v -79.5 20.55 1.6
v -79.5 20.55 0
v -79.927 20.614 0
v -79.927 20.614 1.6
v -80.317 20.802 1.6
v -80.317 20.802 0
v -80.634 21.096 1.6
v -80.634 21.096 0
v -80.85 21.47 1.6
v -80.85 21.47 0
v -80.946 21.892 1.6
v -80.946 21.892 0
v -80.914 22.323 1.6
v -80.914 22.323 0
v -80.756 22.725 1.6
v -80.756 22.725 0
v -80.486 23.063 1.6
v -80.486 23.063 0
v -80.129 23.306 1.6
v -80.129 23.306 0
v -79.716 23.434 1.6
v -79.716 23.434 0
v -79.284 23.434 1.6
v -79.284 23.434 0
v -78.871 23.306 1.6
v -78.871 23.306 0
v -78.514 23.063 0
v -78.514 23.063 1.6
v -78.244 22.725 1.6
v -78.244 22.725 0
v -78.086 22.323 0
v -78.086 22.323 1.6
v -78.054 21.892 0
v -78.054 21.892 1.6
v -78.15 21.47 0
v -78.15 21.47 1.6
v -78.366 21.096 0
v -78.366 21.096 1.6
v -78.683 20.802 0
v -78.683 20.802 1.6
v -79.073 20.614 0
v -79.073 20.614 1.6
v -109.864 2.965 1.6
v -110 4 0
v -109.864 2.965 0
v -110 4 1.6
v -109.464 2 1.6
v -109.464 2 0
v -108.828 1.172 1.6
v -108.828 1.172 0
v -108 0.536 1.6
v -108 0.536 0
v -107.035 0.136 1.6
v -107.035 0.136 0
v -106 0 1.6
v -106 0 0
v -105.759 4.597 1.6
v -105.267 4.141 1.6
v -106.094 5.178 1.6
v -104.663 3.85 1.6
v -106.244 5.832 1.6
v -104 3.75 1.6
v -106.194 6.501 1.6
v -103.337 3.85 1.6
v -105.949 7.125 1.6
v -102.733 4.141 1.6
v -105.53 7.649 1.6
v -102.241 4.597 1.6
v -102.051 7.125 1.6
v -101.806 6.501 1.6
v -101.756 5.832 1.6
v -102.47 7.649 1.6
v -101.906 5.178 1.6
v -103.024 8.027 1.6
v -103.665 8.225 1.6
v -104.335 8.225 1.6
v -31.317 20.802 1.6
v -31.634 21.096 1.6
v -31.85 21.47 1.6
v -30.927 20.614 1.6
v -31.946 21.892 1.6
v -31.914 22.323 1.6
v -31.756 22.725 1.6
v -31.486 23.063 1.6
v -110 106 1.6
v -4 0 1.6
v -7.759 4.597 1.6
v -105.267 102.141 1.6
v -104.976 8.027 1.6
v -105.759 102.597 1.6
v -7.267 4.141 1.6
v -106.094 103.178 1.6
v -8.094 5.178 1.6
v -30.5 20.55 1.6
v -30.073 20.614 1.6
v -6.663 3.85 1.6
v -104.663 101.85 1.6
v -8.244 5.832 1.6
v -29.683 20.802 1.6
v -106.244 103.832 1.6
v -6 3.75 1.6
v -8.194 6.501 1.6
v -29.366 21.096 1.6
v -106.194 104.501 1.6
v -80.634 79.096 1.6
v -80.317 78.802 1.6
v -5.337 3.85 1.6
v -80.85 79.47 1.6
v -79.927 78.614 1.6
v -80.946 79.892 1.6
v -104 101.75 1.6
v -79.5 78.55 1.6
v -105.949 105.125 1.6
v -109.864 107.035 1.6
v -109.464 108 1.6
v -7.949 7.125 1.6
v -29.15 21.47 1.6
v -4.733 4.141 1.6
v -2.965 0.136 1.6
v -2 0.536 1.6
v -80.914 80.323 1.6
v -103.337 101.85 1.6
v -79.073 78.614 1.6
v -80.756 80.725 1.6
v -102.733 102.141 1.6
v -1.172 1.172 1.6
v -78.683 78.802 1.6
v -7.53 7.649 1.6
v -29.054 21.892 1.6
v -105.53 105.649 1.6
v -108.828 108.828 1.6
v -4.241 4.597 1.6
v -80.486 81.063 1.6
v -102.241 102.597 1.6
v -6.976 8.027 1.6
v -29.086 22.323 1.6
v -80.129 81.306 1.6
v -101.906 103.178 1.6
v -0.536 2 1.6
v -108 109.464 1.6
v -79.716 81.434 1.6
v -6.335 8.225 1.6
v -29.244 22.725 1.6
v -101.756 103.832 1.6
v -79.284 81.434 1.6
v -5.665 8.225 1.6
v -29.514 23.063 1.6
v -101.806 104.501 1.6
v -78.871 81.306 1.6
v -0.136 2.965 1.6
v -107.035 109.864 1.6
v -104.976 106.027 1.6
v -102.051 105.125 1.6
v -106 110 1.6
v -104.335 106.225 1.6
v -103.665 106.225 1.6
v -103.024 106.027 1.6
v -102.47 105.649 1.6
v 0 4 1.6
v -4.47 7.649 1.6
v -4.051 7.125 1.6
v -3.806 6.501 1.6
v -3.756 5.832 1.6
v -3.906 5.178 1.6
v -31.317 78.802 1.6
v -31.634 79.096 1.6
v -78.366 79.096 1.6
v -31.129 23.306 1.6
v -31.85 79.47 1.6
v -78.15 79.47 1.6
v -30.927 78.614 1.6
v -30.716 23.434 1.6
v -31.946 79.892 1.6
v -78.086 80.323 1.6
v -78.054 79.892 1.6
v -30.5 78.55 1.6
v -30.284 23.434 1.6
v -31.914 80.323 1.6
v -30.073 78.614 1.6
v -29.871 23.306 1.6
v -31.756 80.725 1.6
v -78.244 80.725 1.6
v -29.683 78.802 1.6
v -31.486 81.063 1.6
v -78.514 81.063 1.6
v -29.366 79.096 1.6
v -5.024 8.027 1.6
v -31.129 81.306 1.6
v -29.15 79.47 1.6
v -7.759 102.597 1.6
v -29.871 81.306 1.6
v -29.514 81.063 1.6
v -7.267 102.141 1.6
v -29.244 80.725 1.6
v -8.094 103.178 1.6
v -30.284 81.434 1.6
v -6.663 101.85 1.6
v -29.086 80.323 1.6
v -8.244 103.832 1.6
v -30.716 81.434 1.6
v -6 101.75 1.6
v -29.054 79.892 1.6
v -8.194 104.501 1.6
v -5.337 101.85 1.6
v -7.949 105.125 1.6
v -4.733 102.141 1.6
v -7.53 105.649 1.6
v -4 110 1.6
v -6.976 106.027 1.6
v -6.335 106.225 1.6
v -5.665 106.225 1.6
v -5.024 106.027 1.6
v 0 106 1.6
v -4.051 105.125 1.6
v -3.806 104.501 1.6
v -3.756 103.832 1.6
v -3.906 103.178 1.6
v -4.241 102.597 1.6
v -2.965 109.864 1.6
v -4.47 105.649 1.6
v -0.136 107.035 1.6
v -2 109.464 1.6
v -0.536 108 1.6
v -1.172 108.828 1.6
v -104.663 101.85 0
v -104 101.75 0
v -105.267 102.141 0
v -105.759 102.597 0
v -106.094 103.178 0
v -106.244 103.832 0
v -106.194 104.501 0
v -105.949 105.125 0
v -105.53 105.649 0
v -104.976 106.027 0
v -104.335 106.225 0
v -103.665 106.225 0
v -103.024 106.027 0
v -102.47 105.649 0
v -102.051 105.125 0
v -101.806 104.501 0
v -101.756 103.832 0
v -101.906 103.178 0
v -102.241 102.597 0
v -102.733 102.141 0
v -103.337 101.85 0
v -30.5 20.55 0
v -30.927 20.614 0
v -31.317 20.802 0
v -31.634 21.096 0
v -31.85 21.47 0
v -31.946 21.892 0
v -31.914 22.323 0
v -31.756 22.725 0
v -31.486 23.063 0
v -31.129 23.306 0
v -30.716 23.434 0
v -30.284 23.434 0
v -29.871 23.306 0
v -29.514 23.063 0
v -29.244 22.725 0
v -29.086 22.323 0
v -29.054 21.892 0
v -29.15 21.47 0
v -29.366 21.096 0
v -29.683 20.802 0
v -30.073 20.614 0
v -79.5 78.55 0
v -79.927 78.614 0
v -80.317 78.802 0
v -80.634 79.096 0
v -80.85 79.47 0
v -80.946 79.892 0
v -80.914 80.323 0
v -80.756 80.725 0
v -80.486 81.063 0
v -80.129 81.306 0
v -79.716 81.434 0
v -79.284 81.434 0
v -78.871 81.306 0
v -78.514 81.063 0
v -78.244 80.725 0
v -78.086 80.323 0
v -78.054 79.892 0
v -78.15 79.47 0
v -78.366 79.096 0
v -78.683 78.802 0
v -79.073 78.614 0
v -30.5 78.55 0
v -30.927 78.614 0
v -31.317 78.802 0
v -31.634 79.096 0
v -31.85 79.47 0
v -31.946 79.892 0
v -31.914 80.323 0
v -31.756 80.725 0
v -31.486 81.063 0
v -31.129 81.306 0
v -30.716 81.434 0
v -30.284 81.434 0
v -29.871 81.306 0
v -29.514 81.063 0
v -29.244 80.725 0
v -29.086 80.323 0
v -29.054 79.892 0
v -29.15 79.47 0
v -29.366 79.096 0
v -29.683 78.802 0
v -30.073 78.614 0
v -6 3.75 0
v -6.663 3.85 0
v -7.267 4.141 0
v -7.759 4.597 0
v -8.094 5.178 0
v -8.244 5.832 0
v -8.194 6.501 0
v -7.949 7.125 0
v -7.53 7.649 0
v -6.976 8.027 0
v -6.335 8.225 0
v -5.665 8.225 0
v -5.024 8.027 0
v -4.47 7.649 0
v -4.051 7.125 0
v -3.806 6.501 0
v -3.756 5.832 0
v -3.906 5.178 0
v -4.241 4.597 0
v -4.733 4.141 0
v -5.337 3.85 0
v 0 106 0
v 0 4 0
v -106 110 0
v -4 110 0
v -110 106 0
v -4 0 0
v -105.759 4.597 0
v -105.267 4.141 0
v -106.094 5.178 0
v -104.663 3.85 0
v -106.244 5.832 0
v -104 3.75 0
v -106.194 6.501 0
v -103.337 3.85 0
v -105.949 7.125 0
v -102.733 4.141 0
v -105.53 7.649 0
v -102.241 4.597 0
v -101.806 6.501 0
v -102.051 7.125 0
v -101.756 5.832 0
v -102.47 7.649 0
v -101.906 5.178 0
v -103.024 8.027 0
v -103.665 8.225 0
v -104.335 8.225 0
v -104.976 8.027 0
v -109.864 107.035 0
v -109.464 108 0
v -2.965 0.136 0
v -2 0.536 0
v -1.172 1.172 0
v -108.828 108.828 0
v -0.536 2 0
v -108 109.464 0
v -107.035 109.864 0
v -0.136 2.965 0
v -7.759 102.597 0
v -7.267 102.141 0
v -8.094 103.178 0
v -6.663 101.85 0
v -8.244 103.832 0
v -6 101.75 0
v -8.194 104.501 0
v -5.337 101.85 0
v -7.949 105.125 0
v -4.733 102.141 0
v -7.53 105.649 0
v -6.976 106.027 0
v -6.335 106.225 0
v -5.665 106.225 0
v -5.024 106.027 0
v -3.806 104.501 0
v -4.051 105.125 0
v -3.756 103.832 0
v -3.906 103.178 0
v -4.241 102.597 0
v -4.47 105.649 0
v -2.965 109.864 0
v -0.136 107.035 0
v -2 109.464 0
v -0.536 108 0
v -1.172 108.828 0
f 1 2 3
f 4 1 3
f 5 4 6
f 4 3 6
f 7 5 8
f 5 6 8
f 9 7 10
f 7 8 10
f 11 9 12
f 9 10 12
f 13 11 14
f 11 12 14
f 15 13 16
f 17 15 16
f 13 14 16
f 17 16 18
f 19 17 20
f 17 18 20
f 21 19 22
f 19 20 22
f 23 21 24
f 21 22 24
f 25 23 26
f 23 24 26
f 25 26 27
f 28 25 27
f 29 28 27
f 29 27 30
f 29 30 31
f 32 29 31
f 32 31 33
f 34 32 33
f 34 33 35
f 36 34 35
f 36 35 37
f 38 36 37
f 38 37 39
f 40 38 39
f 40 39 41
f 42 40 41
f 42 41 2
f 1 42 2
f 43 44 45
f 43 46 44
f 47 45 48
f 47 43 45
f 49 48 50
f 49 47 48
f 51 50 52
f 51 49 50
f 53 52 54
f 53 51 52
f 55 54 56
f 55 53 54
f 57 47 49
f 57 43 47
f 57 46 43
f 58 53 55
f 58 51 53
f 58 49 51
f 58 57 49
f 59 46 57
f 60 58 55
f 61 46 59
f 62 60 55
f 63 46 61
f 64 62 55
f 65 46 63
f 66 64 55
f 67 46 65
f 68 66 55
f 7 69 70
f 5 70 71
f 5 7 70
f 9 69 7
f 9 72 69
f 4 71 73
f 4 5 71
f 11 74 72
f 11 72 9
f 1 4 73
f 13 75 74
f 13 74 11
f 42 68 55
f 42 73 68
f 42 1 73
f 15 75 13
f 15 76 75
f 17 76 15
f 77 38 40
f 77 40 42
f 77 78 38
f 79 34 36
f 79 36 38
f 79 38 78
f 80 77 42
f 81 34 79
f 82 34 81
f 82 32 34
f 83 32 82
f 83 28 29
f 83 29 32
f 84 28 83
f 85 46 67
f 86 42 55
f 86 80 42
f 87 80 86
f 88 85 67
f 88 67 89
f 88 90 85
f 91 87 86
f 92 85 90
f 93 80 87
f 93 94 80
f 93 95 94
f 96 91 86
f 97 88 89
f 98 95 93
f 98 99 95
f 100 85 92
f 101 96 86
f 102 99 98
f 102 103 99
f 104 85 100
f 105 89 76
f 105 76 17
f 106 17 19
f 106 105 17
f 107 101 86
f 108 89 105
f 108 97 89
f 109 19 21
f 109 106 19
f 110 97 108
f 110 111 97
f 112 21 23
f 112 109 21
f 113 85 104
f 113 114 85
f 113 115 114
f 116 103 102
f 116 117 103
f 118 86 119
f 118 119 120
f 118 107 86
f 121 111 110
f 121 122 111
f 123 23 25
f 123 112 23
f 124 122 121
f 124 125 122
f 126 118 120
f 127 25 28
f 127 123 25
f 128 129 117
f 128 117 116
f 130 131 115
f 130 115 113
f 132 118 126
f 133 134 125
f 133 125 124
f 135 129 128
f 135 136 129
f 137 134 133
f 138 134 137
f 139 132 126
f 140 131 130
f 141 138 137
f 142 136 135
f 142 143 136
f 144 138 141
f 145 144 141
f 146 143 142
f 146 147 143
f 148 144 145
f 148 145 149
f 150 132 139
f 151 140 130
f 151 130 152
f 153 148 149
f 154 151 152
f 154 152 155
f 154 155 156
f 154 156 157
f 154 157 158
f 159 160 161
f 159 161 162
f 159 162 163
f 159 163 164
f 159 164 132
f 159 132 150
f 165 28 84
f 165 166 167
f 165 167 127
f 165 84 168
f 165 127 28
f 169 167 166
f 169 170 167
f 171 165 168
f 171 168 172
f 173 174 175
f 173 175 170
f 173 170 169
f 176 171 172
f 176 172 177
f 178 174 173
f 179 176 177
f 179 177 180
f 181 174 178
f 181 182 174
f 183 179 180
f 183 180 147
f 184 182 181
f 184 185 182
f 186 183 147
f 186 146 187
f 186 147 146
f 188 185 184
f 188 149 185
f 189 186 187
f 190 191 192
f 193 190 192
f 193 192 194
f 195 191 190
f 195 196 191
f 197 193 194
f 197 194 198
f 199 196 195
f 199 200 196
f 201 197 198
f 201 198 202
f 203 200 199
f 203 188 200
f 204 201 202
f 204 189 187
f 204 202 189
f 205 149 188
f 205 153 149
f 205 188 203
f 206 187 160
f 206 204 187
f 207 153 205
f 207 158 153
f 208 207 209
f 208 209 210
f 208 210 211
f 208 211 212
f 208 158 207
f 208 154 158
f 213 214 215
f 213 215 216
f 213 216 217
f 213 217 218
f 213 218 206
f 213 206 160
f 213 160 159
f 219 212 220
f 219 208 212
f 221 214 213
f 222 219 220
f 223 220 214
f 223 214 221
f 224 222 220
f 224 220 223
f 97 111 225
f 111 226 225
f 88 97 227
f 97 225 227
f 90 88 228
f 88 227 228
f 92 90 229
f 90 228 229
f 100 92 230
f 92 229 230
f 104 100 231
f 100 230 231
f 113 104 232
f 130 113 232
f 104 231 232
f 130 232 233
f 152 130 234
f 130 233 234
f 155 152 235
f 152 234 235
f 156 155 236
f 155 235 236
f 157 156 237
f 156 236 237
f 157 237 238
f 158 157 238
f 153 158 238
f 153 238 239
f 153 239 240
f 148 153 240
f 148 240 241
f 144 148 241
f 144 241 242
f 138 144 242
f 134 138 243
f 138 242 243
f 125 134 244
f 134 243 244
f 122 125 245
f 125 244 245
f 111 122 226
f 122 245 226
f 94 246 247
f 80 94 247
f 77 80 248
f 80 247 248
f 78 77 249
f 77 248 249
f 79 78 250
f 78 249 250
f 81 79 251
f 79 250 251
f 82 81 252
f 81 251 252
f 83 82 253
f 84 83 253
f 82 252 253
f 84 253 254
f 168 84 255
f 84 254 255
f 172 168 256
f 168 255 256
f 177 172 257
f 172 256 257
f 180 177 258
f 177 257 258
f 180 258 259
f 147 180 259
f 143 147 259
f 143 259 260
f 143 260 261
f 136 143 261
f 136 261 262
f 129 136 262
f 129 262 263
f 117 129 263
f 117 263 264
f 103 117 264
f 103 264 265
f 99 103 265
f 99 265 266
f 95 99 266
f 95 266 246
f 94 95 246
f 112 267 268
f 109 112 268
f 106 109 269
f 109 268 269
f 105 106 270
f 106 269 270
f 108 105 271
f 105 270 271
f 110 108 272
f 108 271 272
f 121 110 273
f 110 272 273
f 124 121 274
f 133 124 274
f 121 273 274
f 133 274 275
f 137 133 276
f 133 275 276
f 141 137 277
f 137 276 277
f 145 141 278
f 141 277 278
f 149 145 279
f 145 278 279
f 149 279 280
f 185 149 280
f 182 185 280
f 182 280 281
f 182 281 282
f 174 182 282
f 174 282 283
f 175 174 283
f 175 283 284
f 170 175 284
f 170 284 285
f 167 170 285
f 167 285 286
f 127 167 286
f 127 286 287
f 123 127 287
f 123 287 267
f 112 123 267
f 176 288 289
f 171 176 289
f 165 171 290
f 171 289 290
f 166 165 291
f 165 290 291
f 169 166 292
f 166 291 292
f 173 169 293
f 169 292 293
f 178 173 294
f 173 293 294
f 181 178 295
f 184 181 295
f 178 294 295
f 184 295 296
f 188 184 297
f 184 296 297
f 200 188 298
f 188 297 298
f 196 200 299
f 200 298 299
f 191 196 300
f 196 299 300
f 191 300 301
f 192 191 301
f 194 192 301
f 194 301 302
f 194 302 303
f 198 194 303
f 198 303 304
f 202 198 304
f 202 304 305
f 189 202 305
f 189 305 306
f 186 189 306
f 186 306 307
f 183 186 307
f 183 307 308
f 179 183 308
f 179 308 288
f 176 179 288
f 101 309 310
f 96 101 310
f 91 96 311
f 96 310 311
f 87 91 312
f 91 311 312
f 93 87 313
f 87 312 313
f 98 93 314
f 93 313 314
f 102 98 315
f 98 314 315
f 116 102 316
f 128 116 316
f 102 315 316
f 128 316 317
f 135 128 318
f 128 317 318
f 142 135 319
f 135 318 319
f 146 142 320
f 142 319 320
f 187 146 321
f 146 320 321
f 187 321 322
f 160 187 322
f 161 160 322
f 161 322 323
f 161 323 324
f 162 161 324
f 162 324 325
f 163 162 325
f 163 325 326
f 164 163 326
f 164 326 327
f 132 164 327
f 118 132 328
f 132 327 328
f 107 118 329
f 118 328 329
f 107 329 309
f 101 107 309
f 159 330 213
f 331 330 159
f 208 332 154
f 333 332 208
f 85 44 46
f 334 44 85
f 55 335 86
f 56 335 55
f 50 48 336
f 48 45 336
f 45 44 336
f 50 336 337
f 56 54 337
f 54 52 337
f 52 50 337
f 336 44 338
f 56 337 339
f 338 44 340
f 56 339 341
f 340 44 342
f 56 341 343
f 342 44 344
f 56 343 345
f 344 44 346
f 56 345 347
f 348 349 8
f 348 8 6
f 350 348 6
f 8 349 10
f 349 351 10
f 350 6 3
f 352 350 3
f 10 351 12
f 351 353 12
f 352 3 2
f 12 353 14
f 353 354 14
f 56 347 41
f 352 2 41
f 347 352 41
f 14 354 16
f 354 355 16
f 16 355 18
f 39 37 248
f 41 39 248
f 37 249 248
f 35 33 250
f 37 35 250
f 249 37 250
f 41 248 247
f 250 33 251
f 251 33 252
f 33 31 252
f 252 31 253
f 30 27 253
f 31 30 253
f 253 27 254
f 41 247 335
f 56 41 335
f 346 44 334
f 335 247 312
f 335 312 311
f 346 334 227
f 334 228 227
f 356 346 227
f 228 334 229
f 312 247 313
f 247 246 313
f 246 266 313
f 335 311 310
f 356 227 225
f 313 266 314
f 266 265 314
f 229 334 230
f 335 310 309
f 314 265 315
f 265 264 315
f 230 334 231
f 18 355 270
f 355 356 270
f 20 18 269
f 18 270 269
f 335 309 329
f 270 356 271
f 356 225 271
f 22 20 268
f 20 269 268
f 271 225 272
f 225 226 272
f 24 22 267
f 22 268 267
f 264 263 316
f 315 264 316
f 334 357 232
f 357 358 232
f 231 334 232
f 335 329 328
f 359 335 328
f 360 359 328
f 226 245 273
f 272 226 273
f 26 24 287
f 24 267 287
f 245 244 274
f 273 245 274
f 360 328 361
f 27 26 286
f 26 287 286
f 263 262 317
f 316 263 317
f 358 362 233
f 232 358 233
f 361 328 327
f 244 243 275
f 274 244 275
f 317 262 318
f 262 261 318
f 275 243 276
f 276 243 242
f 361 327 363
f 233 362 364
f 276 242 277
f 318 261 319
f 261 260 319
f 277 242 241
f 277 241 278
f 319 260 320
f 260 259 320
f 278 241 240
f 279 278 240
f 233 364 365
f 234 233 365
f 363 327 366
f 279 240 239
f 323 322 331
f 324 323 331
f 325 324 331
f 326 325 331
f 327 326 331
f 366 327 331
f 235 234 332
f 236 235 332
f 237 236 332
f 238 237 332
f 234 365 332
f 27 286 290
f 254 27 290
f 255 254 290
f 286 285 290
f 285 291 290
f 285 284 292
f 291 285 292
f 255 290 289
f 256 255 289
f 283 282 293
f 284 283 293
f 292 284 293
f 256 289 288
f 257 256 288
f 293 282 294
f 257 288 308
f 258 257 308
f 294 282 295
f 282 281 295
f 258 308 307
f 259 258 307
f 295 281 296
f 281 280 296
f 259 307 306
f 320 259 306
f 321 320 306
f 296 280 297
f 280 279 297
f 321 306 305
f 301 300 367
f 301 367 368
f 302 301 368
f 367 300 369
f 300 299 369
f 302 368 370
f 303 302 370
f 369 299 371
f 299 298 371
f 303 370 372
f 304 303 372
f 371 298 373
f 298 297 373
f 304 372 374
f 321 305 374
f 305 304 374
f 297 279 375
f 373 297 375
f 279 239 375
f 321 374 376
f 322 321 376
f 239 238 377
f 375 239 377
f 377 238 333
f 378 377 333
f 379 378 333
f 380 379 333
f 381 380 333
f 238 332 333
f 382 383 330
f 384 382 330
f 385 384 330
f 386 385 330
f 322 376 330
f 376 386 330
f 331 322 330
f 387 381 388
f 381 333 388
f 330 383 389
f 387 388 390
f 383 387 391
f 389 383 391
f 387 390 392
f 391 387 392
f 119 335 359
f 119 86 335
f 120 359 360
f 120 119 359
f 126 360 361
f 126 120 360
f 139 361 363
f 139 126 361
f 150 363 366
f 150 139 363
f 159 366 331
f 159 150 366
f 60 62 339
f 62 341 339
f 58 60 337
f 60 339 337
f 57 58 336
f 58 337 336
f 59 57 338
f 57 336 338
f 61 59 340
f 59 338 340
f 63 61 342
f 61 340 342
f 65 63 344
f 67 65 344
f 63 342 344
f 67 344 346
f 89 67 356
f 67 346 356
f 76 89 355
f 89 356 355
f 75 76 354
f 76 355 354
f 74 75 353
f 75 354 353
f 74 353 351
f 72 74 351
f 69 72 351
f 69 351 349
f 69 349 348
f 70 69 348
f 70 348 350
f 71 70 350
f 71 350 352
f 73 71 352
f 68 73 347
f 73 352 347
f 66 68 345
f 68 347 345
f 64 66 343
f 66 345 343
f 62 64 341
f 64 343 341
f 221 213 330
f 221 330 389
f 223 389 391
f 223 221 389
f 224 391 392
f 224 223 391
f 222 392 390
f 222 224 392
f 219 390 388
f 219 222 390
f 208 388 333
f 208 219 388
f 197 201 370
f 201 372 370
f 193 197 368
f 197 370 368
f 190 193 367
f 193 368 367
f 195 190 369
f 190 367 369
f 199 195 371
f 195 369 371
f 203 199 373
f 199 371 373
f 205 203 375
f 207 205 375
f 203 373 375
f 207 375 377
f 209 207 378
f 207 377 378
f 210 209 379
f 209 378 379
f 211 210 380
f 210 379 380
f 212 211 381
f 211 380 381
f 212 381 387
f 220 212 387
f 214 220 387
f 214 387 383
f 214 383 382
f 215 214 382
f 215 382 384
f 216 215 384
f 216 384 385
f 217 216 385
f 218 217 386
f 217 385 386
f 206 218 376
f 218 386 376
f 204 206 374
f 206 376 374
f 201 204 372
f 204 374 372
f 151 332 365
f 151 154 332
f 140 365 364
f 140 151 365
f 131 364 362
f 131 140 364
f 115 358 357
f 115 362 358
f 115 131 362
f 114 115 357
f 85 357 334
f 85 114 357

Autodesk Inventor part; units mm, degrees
ref_plane "YZ Plane" through (0, 0, 0) normal (1, 0, 0) x (0, 1, 0)
ref_plane "XZ Plane" through (0, 0, 0) normal (0, 1, 0) x (-1, 0, 0)
ref_plane "XY Plane" through (0, 0, 0) normal (0, 0, 1) x (1, 0, 0)
sketch "Sketch1" plane through (0, 0, 0) normal (0, 0, 1) x (1, 0, 0)
  line L0 (0, 0) -> (-110, 0)
  line L1 (-110, 0) -> (-110, 110)
  line L2 (-110, 110) -> (0, 110)
  line L3 (0, 110) -> (0, 0)
  dimension "pcb_size" = 110
  dimension "d1" = 110
extrude "Extrusion1" add sketch "Sketch1" along normal blind 1.6
fillet "Fillet1" radius 4 4 edges at (0, 0, 0.8) (0, 110, 0.8) (-110, 110, 0.8) (-110, 0, 0.8)
sketch "Sketch2" plane through (0, 0, 1.6) normal (0, 0, 1) x (1, 0, 0)
  line L0 (0, 4) -> (0, 106) projected
  line L1 (-4, 110) -> (-106, 110) projected
  line L2 (-55, 110) -> (-55, 0) construction
  line L3 (-106, 0) -> (-4, 0) construction
  line L4 (0, 55) -> (-110, 55) construction
  line L5 (-110, 106) -> (-110, 4) construction
  point P0 (0, 0)
  point P1 (-6, 104)
  point P2 (-104, 104)
  point P3 (-6, 6)
  point P4 (-104, 6)
  dimension "d12" = 6
  dimension "d13" = 6
  dimension "pcb_fixation_ecart" = 98
  dimension "d28" = 98
hole "Hole1" at (-6, 104, 1.6) at (-6, 6, 1.6) at (-104, 6, 1.6) at (-104, 104, 1.6) direction (0, 0, -1) diameter 4.5 end through all clearance for "Countersunk Flat Head Screw DIN EN ISO 2009" size "M4" standard "DIN"
sketch "Sketch3" plane through (-55, 69.5861, 1.6) normal (0, 0, 1) x (1, 0, 0)
  line L0 (-24.5, -47.5861) -> (24.5, -47.5861) construction
  line L1 (-24.5, -47.5861) -> (-24.5, 10.4139) construction
  line L2 (0, -47.5861) -> (0, 10.4139) construction
  line L3 (-24.5, 10.4139) -> (24.5, 10.4139) construction
  line L4 (24.5, 10.4139) -> (24.5, -47.5861) construction
  line L5 (0, -4) -> (-24.5, -47.5861) construction
  line L6 (55, -65.5861) -> (55, 36.4139) projected
  line L7 (-55, 36.4139) -> (-55, -65.5861) projected
  line L8 (51, 40.4139) -> (-51, 40.4139) projected
  dimension "d16" = 58
  dimension "d15" = 49
  dimension "d17" = 50
  dimension "d24" = 110
  dimension "d25" = 55
  dimension "d26" = 30
hole "Hole2" at (-79.5, 22, 1.6) at (-79.5, 80, 1.6) at (-30.5, 22, 1.6) at (-30.5, 80, 1.6) direction (0, 0, -1) diameter 2.9 end through all
equation "\"d13\" = d12"
equation "\"d25\" = 0.5 * d24"
properties part number "pcb"
